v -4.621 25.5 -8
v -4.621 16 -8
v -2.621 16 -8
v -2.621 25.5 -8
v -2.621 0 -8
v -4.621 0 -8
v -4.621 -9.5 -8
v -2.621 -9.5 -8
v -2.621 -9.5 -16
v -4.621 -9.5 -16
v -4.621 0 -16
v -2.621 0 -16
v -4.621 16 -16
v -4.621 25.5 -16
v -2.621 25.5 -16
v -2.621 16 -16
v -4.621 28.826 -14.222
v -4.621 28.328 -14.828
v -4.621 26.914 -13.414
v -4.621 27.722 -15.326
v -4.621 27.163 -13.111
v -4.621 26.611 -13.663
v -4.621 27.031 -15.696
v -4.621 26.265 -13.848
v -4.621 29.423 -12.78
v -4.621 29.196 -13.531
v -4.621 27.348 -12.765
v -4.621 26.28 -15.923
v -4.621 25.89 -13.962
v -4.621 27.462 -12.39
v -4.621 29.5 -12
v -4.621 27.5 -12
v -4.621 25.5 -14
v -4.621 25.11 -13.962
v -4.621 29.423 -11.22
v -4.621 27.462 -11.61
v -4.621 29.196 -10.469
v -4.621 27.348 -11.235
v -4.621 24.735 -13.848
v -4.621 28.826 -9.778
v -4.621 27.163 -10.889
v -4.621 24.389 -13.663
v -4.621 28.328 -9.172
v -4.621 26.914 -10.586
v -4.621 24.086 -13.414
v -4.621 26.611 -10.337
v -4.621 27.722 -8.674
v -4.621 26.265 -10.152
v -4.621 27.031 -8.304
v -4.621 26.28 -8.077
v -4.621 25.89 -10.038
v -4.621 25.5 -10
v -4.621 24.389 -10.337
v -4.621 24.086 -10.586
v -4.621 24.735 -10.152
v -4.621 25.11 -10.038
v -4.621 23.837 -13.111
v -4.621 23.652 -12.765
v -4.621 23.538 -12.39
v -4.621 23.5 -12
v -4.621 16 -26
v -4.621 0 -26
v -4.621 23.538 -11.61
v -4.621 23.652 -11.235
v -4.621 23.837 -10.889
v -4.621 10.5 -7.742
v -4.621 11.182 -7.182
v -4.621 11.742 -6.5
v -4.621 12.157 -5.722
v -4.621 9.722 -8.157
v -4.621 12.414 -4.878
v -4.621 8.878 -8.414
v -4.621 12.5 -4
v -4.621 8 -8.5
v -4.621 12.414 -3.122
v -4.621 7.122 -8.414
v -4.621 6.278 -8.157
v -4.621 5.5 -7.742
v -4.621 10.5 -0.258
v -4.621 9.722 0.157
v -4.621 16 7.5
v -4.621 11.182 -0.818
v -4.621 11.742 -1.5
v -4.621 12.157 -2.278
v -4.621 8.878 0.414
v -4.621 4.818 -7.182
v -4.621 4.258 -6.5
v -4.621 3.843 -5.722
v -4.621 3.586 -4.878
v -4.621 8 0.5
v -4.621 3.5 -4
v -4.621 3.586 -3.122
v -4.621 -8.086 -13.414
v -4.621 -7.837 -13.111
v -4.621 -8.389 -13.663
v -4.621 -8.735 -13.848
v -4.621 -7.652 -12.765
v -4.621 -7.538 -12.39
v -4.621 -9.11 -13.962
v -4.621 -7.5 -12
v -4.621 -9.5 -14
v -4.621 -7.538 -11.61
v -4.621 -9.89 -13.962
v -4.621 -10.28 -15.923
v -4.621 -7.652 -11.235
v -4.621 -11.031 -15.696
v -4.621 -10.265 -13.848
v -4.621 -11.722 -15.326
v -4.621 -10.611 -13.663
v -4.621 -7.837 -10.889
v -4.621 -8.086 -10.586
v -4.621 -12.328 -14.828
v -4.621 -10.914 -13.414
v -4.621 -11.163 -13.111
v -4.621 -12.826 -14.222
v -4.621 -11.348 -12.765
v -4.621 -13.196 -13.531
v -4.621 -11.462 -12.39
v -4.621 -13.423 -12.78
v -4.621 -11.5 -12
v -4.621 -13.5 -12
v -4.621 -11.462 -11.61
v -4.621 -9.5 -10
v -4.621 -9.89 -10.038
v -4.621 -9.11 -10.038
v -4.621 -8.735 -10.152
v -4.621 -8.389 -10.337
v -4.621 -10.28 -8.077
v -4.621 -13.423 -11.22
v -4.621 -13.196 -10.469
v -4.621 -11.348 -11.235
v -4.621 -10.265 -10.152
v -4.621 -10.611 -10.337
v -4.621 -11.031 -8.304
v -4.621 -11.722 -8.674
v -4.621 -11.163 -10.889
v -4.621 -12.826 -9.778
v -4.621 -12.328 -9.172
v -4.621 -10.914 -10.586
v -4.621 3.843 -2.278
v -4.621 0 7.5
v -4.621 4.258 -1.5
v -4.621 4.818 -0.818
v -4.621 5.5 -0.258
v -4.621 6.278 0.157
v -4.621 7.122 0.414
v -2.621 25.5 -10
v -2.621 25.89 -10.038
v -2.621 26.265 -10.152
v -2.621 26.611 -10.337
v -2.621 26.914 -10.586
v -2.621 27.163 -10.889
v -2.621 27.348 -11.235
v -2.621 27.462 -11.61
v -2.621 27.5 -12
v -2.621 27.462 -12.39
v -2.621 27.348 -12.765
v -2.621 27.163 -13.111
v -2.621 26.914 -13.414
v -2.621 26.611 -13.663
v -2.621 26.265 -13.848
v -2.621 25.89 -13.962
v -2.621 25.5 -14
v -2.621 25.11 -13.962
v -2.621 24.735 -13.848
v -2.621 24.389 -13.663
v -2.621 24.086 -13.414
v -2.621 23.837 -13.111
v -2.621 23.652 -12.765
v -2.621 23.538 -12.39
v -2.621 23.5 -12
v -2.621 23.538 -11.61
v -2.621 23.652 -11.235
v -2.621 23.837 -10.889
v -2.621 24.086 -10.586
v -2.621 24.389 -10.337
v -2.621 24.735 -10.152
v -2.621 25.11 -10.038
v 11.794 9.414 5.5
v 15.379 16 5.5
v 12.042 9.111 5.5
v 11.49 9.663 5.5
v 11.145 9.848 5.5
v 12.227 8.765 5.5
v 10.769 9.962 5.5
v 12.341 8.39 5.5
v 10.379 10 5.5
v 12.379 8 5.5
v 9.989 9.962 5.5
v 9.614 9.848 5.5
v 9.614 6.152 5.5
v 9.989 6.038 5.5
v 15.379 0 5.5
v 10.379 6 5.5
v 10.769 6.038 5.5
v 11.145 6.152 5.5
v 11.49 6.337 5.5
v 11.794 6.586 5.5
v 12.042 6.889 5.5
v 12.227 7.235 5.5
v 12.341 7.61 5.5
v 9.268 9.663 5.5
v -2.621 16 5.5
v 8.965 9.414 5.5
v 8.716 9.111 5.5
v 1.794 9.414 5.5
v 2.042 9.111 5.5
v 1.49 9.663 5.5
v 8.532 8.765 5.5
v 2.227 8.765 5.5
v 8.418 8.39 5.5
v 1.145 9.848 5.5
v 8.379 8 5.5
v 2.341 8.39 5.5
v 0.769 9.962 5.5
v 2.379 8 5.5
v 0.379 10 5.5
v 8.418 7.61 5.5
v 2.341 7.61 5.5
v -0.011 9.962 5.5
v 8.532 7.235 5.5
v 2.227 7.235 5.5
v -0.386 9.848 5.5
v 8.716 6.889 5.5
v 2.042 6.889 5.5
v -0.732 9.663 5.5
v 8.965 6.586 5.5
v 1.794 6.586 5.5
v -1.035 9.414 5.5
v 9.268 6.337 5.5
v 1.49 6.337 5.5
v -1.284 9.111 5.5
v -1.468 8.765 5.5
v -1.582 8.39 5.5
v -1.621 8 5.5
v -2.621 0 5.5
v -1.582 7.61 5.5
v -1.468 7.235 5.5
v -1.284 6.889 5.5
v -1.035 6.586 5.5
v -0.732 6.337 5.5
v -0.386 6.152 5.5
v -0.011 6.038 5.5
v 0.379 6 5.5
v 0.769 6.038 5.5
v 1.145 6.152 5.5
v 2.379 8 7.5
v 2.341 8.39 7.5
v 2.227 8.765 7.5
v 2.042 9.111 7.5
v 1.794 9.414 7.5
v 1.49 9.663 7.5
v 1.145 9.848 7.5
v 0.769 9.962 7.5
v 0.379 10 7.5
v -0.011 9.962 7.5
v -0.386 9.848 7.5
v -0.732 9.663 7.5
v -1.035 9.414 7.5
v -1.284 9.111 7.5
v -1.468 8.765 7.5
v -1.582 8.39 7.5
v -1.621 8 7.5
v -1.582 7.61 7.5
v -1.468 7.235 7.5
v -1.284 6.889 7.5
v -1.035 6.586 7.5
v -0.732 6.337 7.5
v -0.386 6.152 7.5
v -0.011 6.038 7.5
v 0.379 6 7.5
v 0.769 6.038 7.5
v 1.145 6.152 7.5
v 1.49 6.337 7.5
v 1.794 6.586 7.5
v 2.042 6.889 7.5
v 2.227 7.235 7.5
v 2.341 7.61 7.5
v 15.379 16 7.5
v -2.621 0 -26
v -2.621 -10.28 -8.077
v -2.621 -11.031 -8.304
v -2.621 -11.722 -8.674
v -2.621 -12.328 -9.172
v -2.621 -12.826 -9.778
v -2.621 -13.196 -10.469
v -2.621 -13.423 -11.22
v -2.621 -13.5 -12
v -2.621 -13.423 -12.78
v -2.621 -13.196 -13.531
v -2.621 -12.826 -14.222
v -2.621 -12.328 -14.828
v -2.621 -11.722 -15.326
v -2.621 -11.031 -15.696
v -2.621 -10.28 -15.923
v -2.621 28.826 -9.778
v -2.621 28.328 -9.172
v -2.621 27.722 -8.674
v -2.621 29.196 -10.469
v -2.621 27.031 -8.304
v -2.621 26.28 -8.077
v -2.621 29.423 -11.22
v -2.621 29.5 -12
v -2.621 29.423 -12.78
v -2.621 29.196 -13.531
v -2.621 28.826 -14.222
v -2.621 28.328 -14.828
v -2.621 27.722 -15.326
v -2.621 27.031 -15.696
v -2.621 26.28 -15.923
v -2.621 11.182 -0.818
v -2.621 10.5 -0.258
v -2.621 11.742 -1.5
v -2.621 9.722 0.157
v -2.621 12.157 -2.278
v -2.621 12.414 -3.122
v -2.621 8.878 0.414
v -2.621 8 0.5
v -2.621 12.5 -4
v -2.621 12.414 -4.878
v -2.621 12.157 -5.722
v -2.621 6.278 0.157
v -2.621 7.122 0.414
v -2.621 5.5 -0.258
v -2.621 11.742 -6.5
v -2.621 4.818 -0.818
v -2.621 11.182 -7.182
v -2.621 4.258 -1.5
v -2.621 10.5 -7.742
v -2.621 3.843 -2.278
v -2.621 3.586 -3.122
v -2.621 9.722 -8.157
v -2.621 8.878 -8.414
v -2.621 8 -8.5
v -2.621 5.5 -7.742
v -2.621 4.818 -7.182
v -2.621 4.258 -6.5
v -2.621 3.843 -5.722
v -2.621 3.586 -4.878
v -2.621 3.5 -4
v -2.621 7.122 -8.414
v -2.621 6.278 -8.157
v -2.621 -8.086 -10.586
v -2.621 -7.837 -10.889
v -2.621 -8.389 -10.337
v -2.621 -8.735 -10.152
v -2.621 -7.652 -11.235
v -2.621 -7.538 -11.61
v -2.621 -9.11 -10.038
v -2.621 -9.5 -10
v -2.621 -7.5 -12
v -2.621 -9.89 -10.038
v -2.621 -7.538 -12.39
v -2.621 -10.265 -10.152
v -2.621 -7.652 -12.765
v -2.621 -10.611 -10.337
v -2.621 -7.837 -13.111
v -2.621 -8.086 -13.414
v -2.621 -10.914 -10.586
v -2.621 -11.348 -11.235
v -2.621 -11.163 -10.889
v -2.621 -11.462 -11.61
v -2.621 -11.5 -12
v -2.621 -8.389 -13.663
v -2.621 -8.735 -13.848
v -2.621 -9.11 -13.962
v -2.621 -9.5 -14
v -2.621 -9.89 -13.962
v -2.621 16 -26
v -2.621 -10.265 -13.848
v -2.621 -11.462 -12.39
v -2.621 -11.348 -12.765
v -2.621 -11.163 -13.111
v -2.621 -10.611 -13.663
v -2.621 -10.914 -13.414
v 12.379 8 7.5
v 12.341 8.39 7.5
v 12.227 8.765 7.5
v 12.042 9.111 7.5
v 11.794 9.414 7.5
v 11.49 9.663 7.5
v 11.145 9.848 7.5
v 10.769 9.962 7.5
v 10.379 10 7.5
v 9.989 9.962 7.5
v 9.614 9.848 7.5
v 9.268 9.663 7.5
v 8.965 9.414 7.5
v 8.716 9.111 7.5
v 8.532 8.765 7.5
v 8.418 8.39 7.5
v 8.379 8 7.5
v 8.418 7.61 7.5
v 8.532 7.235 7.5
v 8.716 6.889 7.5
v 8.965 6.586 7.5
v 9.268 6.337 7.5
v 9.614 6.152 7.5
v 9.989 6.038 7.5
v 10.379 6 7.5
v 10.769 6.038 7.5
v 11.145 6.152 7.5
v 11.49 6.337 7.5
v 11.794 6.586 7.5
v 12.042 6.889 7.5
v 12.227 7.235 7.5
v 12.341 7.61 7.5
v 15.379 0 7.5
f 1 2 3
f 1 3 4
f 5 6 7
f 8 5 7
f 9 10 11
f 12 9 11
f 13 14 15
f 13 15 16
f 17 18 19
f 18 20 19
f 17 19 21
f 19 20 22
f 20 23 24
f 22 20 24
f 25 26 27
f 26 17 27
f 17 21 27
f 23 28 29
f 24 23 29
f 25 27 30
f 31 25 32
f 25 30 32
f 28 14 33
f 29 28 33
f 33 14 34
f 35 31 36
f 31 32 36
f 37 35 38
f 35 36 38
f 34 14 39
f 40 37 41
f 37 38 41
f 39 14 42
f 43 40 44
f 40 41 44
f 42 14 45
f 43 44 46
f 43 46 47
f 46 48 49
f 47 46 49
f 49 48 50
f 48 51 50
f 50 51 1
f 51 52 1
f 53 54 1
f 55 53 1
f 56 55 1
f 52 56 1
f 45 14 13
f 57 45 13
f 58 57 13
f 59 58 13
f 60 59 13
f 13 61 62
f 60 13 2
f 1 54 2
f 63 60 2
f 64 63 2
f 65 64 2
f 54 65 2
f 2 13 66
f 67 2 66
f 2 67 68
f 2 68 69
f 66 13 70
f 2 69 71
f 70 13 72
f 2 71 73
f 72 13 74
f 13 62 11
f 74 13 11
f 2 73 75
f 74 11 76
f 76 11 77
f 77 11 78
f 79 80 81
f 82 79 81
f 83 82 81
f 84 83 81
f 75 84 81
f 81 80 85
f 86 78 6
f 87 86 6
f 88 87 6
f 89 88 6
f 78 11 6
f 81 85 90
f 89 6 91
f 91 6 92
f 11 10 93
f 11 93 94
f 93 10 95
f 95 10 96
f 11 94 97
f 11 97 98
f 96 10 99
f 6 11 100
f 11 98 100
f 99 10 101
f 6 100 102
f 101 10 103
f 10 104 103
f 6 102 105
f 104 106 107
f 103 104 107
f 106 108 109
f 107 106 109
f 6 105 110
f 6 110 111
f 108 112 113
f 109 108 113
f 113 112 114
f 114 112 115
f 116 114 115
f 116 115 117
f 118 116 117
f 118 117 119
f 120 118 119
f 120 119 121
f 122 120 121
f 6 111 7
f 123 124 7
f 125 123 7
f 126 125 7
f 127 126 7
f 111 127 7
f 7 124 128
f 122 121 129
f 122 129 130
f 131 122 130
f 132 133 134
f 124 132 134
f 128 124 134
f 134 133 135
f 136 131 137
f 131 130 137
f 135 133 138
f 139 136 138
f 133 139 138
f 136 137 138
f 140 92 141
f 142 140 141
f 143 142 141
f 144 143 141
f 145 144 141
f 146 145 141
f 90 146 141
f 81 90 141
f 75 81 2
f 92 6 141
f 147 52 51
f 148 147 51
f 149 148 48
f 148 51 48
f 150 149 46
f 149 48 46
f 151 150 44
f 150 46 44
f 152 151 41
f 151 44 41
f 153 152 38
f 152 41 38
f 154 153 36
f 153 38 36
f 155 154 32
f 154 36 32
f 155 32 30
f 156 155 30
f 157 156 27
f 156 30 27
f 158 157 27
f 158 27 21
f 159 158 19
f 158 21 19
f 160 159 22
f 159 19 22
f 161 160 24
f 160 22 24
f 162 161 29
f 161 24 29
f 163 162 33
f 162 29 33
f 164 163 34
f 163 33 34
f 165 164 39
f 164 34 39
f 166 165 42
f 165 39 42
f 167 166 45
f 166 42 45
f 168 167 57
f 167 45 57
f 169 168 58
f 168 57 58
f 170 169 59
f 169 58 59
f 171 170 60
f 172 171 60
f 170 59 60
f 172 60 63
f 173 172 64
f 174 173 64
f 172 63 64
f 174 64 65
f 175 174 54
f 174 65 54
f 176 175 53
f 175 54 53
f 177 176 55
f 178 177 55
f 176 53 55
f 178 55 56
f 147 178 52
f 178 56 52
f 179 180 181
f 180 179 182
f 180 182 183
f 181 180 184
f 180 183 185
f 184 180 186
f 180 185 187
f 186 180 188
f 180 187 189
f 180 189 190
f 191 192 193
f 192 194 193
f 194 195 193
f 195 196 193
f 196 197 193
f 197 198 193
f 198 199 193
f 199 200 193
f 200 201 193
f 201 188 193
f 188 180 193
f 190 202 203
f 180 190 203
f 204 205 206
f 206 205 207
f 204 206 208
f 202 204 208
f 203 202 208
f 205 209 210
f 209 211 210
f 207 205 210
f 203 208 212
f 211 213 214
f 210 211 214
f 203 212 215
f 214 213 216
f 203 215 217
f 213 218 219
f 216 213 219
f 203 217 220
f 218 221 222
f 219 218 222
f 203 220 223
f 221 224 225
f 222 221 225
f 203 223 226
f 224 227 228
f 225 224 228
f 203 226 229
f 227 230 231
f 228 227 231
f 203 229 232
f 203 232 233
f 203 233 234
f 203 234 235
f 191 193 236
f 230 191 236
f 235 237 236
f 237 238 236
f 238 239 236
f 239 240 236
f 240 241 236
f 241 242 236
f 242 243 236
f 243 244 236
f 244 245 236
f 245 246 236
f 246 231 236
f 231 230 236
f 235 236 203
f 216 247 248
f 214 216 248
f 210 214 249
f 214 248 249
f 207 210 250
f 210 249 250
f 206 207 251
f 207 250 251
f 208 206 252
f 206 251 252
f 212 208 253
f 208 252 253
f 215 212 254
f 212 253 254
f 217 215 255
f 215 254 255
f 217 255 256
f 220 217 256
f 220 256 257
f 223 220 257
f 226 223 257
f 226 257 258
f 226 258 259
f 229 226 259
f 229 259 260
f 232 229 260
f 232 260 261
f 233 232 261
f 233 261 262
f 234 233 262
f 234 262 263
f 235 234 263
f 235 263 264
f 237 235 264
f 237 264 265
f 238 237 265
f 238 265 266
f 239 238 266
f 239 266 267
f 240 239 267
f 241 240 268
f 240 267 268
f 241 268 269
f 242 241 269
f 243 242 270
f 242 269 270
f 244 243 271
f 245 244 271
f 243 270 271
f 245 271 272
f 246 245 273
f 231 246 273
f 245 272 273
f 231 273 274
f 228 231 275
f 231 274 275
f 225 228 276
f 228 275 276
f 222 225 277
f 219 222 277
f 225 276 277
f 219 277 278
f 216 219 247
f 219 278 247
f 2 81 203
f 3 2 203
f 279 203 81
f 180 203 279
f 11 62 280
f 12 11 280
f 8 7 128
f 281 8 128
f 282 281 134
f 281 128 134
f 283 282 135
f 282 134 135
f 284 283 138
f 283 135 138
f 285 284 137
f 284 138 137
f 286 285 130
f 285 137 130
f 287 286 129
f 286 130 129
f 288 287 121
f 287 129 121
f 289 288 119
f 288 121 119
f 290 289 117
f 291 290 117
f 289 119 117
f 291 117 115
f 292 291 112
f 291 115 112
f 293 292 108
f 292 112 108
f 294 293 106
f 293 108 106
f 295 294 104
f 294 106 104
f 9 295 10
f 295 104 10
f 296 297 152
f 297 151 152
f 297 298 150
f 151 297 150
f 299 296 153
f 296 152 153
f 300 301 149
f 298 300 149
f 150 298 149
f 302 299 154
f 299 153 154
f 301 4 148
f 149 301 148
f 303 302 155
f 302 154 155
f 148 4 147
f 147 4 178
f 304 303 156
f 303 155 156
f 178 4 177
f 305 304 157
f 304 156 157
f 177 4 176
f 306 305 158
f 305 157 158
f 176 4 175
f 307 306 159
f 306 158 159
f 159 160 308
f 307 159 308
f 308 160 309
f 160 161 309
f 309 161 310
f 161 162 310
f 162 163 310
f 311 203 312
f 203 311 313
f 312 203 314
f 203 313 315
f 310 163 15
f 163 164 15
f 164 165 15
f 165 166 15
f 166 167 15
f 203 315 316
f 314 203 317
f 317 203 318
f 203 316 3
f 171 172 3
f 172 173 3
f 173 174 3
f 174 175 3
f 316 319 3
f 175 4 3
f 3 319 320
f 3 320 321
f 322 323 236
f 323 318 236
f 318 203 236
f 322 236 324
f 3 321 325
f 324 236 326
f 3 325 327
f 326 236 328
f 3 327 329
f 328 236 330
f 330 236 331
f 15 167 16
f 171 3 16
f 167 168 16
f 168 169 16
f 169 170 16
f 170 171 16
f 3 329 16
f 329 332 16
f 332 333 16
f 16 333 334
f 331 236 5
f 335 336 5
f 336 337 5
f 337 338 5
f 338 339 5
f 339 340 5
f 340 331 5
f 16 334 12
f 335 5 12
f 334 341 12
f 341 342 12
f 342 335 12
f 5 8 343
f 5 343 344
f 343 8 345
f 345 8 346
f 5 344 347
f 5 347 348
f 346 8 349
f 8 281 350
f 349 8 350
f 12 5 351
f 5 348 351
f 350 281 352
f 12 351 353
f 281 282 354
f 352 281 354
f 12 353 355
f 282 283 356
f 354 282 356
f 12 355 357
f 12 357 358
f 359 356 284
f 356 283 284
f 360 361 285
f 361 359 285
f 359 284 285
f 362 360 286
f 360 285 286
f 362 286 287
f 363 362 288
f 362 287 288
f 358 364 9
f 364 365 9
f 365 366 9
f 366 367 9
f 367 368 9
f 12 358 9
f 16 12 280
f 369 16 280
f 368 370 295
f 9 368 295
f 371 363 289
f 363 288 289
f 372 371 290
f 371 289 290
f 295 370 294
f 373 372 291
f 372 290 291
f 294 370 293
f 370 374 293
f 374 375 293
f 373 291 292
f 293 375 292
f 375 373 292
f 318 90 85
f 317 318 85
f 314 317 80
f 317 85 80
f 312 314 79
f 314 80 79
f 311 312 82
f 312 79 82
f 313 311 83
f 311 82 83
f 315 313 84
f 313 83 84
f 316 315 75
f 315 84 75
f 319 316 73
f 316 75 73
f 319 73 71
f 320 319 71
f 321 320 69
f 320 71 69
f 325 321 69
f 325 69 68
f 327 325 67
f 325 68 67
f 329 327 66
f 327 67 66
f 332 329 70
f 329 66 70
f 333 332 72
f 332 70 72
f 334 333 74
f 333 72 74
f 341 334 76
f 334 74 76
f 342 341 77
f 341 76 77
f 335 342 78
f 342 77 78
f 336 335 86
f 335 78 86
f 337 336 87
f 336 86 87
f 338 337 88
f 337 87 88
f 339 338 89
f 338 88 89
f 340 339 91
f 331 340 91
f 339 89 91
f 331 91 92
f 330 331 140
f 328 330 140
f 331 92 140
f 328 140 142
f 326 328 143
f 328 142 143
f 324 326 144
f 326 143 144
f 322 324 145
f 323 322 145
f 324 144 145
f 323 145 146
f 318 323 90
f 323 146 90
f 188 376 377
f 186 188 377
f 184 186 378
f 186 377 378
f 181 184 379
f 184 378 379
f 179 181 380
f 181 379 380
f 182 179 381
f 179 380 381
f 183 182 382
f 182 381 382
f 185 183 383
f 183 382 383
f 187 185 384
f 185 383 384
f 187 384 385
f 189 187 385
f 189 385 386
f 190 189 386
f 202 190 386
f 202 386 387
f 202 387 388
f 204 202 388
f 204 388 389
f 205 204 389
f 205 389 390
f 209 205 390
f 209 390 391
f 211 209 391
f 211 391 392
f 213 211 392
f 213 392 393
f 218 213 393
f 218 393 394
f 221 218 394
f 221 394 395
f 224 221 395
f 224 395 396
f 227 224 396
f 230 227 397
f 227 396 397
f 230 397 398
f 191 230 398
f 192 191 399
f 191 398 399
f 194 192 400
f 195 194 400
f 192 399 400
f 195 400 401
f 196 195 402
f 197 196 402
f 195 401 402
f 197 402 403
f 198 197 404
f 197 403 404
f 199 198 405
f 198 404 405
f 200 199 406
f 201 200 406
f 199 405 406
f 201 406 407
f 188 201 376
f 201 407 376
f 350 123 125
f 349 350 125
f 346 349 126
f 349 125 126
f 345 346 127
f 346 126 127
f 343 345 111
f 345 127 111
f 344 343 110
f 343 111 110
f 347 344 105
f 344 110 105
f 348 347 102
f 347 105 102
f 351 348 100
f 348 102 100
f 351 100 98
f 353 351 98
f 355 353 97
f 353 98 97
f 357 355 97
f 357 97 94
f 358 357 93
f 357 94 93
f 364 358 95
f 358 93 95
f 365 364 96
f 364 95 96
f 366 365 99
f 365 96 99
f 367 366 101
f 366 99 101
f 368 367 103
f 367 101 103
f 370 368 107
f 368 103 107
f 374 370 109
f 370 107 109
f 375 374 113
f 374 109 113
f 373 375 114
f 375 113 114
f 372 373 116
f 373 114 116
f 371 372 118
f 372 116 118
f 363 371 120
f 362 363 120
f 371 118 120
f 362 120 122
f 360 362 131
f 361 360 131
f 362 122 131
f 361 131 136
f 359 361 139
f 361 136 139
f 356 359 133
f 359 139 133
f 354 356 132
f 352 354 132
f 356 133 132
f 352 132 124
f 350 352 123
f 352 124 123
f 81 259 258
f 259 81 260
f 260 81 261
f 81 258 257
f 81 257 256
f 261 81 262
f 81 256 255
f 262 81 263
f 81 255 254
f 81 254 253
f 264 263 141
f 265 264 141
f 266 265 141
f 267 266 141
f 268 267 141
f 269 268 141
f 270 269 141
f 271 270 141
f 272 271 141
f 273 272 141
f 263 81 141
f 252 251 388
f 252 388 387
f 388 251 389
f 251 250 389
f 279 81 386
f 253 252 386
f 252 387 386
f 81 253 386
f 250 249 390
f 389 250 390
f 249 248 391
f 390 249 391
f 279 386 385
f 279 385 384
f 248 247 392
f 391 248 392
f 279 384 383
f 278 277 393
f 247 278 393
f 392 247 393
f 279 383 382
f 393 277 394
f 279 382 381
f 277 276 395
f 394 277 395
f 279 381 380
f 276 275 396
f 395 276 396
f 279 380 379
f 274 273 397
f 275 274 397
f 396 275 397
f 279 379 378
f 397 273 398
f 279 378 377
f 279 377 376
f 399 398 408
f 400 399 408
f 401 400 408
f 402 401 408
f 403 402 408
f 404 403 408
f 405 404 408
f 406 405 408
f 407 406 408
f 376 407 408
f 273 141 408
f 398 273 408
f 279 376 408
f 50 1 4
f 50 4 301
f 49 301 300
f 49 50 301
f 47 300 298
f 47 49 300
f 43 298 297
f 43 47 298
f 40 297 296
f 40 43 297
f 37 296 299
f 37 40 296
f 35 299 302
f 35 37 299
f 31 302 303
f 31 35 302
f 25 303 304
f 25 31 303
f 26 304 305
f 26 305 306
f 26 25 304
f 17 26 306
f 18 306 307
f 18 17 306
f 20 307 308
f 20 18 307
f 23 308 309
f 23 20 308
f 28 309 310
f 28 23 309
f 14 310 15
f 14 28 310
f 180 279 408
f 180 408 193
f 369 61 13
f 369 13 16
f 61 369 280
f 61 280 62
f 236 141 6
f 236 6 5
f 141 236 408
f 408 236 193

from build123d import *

# Parameters (mm, degrees)
BOSS_EXTRUDE1_DEPTH = 16
SKETCH2_R           = 2
CUT_EXTRUDE1_DEPTH  = 16
SKETCH3_R           = 2
BOSS_EXTRUDE2_DEPTH = 2
SKETCH4_R           = 4.5
CUT_EXTRUDE2_DEPTH  = 2


with BuildPart() as part:
    # Sketch1 → Boss-Extrude1 (new body)
    with BuildSketch(Plane(origin=(0, 0, 0), x_dir=(1, 0, 0), z_dir=(0, 1, 0))):
        Polygon((-4.620689655, 26), (-4.620689655, -7.5), (15.379310345, -7.5), (15.379310345, -5.5), (-2.620689655, -5.5), (-2.620689655, 26), align=None)
    extrude(amount=BOSS_EXTRUDE1_DEPTH)

    # Sketch2 → Cut-Extrude1 (cut)
    with BuildSketch(Plane.XY.offset(7.5)):
        with Locations((0.379310345, 8)):
            Circle(SKETCH2_R)
        with Locations((10.379310345, 8)):
            Circle(SKETCH2_R)
    extrude(amount=-CUT_EXTRUDE1_DEPTH, mode=Mode.SUBTRACT)

    # Sketch3 → Boss-Extrude2 (add)
    # profile 1 of 2: a face of its own
    with BuildSketch(Plane.ZY.offset(4.620689655)):
        with BuildLine():
            Line((-16, 16), (-8, 16))
            Line((-8, 16), (-8, 25.5))
            ThreePointArc((-8, 25.5), (-12, 29.5), (-16, 25.5))
            Line((-16, 25.5), (-16, 16))
        make_face()
        with Locations((-12, 25.5)):
            Circle(SKETCH3_R, mode=Mode.SUBTRACT)
    # profile 2 of 2: a face of its own
    with BuildSketch(Plane.ZY.offset(4.620689655)):
        with BuildLine():
            Line((-16, 0), (-8, 0))
            Line((-8, 0), (-8, -9.5))
            ThreePointArc((-8, -9.5), (-12, -13.5), (-16, -9.5))
            Line((-16, -9.5), (-16, 0))
        make_face()
        with Locations((-12, -9.5)):
            Circle(SKETCH3_R, mode=Mode.SUBTRACT)
    extrude(amount=-BOSS_EXTRUDE2_DEPTH)

    # Sketch4 → Cut-Extrude2 (cut)
    with BuildSketch(Plane.ZY.offset(4.620689655)):
        with Locations((-4, 8)):
            Circle(SKETCH4_R)
    extrude(amount=-CUT_EXTRUDE2_DEPTH, mode=Mode.SUBTRACT)


solid = part.part
